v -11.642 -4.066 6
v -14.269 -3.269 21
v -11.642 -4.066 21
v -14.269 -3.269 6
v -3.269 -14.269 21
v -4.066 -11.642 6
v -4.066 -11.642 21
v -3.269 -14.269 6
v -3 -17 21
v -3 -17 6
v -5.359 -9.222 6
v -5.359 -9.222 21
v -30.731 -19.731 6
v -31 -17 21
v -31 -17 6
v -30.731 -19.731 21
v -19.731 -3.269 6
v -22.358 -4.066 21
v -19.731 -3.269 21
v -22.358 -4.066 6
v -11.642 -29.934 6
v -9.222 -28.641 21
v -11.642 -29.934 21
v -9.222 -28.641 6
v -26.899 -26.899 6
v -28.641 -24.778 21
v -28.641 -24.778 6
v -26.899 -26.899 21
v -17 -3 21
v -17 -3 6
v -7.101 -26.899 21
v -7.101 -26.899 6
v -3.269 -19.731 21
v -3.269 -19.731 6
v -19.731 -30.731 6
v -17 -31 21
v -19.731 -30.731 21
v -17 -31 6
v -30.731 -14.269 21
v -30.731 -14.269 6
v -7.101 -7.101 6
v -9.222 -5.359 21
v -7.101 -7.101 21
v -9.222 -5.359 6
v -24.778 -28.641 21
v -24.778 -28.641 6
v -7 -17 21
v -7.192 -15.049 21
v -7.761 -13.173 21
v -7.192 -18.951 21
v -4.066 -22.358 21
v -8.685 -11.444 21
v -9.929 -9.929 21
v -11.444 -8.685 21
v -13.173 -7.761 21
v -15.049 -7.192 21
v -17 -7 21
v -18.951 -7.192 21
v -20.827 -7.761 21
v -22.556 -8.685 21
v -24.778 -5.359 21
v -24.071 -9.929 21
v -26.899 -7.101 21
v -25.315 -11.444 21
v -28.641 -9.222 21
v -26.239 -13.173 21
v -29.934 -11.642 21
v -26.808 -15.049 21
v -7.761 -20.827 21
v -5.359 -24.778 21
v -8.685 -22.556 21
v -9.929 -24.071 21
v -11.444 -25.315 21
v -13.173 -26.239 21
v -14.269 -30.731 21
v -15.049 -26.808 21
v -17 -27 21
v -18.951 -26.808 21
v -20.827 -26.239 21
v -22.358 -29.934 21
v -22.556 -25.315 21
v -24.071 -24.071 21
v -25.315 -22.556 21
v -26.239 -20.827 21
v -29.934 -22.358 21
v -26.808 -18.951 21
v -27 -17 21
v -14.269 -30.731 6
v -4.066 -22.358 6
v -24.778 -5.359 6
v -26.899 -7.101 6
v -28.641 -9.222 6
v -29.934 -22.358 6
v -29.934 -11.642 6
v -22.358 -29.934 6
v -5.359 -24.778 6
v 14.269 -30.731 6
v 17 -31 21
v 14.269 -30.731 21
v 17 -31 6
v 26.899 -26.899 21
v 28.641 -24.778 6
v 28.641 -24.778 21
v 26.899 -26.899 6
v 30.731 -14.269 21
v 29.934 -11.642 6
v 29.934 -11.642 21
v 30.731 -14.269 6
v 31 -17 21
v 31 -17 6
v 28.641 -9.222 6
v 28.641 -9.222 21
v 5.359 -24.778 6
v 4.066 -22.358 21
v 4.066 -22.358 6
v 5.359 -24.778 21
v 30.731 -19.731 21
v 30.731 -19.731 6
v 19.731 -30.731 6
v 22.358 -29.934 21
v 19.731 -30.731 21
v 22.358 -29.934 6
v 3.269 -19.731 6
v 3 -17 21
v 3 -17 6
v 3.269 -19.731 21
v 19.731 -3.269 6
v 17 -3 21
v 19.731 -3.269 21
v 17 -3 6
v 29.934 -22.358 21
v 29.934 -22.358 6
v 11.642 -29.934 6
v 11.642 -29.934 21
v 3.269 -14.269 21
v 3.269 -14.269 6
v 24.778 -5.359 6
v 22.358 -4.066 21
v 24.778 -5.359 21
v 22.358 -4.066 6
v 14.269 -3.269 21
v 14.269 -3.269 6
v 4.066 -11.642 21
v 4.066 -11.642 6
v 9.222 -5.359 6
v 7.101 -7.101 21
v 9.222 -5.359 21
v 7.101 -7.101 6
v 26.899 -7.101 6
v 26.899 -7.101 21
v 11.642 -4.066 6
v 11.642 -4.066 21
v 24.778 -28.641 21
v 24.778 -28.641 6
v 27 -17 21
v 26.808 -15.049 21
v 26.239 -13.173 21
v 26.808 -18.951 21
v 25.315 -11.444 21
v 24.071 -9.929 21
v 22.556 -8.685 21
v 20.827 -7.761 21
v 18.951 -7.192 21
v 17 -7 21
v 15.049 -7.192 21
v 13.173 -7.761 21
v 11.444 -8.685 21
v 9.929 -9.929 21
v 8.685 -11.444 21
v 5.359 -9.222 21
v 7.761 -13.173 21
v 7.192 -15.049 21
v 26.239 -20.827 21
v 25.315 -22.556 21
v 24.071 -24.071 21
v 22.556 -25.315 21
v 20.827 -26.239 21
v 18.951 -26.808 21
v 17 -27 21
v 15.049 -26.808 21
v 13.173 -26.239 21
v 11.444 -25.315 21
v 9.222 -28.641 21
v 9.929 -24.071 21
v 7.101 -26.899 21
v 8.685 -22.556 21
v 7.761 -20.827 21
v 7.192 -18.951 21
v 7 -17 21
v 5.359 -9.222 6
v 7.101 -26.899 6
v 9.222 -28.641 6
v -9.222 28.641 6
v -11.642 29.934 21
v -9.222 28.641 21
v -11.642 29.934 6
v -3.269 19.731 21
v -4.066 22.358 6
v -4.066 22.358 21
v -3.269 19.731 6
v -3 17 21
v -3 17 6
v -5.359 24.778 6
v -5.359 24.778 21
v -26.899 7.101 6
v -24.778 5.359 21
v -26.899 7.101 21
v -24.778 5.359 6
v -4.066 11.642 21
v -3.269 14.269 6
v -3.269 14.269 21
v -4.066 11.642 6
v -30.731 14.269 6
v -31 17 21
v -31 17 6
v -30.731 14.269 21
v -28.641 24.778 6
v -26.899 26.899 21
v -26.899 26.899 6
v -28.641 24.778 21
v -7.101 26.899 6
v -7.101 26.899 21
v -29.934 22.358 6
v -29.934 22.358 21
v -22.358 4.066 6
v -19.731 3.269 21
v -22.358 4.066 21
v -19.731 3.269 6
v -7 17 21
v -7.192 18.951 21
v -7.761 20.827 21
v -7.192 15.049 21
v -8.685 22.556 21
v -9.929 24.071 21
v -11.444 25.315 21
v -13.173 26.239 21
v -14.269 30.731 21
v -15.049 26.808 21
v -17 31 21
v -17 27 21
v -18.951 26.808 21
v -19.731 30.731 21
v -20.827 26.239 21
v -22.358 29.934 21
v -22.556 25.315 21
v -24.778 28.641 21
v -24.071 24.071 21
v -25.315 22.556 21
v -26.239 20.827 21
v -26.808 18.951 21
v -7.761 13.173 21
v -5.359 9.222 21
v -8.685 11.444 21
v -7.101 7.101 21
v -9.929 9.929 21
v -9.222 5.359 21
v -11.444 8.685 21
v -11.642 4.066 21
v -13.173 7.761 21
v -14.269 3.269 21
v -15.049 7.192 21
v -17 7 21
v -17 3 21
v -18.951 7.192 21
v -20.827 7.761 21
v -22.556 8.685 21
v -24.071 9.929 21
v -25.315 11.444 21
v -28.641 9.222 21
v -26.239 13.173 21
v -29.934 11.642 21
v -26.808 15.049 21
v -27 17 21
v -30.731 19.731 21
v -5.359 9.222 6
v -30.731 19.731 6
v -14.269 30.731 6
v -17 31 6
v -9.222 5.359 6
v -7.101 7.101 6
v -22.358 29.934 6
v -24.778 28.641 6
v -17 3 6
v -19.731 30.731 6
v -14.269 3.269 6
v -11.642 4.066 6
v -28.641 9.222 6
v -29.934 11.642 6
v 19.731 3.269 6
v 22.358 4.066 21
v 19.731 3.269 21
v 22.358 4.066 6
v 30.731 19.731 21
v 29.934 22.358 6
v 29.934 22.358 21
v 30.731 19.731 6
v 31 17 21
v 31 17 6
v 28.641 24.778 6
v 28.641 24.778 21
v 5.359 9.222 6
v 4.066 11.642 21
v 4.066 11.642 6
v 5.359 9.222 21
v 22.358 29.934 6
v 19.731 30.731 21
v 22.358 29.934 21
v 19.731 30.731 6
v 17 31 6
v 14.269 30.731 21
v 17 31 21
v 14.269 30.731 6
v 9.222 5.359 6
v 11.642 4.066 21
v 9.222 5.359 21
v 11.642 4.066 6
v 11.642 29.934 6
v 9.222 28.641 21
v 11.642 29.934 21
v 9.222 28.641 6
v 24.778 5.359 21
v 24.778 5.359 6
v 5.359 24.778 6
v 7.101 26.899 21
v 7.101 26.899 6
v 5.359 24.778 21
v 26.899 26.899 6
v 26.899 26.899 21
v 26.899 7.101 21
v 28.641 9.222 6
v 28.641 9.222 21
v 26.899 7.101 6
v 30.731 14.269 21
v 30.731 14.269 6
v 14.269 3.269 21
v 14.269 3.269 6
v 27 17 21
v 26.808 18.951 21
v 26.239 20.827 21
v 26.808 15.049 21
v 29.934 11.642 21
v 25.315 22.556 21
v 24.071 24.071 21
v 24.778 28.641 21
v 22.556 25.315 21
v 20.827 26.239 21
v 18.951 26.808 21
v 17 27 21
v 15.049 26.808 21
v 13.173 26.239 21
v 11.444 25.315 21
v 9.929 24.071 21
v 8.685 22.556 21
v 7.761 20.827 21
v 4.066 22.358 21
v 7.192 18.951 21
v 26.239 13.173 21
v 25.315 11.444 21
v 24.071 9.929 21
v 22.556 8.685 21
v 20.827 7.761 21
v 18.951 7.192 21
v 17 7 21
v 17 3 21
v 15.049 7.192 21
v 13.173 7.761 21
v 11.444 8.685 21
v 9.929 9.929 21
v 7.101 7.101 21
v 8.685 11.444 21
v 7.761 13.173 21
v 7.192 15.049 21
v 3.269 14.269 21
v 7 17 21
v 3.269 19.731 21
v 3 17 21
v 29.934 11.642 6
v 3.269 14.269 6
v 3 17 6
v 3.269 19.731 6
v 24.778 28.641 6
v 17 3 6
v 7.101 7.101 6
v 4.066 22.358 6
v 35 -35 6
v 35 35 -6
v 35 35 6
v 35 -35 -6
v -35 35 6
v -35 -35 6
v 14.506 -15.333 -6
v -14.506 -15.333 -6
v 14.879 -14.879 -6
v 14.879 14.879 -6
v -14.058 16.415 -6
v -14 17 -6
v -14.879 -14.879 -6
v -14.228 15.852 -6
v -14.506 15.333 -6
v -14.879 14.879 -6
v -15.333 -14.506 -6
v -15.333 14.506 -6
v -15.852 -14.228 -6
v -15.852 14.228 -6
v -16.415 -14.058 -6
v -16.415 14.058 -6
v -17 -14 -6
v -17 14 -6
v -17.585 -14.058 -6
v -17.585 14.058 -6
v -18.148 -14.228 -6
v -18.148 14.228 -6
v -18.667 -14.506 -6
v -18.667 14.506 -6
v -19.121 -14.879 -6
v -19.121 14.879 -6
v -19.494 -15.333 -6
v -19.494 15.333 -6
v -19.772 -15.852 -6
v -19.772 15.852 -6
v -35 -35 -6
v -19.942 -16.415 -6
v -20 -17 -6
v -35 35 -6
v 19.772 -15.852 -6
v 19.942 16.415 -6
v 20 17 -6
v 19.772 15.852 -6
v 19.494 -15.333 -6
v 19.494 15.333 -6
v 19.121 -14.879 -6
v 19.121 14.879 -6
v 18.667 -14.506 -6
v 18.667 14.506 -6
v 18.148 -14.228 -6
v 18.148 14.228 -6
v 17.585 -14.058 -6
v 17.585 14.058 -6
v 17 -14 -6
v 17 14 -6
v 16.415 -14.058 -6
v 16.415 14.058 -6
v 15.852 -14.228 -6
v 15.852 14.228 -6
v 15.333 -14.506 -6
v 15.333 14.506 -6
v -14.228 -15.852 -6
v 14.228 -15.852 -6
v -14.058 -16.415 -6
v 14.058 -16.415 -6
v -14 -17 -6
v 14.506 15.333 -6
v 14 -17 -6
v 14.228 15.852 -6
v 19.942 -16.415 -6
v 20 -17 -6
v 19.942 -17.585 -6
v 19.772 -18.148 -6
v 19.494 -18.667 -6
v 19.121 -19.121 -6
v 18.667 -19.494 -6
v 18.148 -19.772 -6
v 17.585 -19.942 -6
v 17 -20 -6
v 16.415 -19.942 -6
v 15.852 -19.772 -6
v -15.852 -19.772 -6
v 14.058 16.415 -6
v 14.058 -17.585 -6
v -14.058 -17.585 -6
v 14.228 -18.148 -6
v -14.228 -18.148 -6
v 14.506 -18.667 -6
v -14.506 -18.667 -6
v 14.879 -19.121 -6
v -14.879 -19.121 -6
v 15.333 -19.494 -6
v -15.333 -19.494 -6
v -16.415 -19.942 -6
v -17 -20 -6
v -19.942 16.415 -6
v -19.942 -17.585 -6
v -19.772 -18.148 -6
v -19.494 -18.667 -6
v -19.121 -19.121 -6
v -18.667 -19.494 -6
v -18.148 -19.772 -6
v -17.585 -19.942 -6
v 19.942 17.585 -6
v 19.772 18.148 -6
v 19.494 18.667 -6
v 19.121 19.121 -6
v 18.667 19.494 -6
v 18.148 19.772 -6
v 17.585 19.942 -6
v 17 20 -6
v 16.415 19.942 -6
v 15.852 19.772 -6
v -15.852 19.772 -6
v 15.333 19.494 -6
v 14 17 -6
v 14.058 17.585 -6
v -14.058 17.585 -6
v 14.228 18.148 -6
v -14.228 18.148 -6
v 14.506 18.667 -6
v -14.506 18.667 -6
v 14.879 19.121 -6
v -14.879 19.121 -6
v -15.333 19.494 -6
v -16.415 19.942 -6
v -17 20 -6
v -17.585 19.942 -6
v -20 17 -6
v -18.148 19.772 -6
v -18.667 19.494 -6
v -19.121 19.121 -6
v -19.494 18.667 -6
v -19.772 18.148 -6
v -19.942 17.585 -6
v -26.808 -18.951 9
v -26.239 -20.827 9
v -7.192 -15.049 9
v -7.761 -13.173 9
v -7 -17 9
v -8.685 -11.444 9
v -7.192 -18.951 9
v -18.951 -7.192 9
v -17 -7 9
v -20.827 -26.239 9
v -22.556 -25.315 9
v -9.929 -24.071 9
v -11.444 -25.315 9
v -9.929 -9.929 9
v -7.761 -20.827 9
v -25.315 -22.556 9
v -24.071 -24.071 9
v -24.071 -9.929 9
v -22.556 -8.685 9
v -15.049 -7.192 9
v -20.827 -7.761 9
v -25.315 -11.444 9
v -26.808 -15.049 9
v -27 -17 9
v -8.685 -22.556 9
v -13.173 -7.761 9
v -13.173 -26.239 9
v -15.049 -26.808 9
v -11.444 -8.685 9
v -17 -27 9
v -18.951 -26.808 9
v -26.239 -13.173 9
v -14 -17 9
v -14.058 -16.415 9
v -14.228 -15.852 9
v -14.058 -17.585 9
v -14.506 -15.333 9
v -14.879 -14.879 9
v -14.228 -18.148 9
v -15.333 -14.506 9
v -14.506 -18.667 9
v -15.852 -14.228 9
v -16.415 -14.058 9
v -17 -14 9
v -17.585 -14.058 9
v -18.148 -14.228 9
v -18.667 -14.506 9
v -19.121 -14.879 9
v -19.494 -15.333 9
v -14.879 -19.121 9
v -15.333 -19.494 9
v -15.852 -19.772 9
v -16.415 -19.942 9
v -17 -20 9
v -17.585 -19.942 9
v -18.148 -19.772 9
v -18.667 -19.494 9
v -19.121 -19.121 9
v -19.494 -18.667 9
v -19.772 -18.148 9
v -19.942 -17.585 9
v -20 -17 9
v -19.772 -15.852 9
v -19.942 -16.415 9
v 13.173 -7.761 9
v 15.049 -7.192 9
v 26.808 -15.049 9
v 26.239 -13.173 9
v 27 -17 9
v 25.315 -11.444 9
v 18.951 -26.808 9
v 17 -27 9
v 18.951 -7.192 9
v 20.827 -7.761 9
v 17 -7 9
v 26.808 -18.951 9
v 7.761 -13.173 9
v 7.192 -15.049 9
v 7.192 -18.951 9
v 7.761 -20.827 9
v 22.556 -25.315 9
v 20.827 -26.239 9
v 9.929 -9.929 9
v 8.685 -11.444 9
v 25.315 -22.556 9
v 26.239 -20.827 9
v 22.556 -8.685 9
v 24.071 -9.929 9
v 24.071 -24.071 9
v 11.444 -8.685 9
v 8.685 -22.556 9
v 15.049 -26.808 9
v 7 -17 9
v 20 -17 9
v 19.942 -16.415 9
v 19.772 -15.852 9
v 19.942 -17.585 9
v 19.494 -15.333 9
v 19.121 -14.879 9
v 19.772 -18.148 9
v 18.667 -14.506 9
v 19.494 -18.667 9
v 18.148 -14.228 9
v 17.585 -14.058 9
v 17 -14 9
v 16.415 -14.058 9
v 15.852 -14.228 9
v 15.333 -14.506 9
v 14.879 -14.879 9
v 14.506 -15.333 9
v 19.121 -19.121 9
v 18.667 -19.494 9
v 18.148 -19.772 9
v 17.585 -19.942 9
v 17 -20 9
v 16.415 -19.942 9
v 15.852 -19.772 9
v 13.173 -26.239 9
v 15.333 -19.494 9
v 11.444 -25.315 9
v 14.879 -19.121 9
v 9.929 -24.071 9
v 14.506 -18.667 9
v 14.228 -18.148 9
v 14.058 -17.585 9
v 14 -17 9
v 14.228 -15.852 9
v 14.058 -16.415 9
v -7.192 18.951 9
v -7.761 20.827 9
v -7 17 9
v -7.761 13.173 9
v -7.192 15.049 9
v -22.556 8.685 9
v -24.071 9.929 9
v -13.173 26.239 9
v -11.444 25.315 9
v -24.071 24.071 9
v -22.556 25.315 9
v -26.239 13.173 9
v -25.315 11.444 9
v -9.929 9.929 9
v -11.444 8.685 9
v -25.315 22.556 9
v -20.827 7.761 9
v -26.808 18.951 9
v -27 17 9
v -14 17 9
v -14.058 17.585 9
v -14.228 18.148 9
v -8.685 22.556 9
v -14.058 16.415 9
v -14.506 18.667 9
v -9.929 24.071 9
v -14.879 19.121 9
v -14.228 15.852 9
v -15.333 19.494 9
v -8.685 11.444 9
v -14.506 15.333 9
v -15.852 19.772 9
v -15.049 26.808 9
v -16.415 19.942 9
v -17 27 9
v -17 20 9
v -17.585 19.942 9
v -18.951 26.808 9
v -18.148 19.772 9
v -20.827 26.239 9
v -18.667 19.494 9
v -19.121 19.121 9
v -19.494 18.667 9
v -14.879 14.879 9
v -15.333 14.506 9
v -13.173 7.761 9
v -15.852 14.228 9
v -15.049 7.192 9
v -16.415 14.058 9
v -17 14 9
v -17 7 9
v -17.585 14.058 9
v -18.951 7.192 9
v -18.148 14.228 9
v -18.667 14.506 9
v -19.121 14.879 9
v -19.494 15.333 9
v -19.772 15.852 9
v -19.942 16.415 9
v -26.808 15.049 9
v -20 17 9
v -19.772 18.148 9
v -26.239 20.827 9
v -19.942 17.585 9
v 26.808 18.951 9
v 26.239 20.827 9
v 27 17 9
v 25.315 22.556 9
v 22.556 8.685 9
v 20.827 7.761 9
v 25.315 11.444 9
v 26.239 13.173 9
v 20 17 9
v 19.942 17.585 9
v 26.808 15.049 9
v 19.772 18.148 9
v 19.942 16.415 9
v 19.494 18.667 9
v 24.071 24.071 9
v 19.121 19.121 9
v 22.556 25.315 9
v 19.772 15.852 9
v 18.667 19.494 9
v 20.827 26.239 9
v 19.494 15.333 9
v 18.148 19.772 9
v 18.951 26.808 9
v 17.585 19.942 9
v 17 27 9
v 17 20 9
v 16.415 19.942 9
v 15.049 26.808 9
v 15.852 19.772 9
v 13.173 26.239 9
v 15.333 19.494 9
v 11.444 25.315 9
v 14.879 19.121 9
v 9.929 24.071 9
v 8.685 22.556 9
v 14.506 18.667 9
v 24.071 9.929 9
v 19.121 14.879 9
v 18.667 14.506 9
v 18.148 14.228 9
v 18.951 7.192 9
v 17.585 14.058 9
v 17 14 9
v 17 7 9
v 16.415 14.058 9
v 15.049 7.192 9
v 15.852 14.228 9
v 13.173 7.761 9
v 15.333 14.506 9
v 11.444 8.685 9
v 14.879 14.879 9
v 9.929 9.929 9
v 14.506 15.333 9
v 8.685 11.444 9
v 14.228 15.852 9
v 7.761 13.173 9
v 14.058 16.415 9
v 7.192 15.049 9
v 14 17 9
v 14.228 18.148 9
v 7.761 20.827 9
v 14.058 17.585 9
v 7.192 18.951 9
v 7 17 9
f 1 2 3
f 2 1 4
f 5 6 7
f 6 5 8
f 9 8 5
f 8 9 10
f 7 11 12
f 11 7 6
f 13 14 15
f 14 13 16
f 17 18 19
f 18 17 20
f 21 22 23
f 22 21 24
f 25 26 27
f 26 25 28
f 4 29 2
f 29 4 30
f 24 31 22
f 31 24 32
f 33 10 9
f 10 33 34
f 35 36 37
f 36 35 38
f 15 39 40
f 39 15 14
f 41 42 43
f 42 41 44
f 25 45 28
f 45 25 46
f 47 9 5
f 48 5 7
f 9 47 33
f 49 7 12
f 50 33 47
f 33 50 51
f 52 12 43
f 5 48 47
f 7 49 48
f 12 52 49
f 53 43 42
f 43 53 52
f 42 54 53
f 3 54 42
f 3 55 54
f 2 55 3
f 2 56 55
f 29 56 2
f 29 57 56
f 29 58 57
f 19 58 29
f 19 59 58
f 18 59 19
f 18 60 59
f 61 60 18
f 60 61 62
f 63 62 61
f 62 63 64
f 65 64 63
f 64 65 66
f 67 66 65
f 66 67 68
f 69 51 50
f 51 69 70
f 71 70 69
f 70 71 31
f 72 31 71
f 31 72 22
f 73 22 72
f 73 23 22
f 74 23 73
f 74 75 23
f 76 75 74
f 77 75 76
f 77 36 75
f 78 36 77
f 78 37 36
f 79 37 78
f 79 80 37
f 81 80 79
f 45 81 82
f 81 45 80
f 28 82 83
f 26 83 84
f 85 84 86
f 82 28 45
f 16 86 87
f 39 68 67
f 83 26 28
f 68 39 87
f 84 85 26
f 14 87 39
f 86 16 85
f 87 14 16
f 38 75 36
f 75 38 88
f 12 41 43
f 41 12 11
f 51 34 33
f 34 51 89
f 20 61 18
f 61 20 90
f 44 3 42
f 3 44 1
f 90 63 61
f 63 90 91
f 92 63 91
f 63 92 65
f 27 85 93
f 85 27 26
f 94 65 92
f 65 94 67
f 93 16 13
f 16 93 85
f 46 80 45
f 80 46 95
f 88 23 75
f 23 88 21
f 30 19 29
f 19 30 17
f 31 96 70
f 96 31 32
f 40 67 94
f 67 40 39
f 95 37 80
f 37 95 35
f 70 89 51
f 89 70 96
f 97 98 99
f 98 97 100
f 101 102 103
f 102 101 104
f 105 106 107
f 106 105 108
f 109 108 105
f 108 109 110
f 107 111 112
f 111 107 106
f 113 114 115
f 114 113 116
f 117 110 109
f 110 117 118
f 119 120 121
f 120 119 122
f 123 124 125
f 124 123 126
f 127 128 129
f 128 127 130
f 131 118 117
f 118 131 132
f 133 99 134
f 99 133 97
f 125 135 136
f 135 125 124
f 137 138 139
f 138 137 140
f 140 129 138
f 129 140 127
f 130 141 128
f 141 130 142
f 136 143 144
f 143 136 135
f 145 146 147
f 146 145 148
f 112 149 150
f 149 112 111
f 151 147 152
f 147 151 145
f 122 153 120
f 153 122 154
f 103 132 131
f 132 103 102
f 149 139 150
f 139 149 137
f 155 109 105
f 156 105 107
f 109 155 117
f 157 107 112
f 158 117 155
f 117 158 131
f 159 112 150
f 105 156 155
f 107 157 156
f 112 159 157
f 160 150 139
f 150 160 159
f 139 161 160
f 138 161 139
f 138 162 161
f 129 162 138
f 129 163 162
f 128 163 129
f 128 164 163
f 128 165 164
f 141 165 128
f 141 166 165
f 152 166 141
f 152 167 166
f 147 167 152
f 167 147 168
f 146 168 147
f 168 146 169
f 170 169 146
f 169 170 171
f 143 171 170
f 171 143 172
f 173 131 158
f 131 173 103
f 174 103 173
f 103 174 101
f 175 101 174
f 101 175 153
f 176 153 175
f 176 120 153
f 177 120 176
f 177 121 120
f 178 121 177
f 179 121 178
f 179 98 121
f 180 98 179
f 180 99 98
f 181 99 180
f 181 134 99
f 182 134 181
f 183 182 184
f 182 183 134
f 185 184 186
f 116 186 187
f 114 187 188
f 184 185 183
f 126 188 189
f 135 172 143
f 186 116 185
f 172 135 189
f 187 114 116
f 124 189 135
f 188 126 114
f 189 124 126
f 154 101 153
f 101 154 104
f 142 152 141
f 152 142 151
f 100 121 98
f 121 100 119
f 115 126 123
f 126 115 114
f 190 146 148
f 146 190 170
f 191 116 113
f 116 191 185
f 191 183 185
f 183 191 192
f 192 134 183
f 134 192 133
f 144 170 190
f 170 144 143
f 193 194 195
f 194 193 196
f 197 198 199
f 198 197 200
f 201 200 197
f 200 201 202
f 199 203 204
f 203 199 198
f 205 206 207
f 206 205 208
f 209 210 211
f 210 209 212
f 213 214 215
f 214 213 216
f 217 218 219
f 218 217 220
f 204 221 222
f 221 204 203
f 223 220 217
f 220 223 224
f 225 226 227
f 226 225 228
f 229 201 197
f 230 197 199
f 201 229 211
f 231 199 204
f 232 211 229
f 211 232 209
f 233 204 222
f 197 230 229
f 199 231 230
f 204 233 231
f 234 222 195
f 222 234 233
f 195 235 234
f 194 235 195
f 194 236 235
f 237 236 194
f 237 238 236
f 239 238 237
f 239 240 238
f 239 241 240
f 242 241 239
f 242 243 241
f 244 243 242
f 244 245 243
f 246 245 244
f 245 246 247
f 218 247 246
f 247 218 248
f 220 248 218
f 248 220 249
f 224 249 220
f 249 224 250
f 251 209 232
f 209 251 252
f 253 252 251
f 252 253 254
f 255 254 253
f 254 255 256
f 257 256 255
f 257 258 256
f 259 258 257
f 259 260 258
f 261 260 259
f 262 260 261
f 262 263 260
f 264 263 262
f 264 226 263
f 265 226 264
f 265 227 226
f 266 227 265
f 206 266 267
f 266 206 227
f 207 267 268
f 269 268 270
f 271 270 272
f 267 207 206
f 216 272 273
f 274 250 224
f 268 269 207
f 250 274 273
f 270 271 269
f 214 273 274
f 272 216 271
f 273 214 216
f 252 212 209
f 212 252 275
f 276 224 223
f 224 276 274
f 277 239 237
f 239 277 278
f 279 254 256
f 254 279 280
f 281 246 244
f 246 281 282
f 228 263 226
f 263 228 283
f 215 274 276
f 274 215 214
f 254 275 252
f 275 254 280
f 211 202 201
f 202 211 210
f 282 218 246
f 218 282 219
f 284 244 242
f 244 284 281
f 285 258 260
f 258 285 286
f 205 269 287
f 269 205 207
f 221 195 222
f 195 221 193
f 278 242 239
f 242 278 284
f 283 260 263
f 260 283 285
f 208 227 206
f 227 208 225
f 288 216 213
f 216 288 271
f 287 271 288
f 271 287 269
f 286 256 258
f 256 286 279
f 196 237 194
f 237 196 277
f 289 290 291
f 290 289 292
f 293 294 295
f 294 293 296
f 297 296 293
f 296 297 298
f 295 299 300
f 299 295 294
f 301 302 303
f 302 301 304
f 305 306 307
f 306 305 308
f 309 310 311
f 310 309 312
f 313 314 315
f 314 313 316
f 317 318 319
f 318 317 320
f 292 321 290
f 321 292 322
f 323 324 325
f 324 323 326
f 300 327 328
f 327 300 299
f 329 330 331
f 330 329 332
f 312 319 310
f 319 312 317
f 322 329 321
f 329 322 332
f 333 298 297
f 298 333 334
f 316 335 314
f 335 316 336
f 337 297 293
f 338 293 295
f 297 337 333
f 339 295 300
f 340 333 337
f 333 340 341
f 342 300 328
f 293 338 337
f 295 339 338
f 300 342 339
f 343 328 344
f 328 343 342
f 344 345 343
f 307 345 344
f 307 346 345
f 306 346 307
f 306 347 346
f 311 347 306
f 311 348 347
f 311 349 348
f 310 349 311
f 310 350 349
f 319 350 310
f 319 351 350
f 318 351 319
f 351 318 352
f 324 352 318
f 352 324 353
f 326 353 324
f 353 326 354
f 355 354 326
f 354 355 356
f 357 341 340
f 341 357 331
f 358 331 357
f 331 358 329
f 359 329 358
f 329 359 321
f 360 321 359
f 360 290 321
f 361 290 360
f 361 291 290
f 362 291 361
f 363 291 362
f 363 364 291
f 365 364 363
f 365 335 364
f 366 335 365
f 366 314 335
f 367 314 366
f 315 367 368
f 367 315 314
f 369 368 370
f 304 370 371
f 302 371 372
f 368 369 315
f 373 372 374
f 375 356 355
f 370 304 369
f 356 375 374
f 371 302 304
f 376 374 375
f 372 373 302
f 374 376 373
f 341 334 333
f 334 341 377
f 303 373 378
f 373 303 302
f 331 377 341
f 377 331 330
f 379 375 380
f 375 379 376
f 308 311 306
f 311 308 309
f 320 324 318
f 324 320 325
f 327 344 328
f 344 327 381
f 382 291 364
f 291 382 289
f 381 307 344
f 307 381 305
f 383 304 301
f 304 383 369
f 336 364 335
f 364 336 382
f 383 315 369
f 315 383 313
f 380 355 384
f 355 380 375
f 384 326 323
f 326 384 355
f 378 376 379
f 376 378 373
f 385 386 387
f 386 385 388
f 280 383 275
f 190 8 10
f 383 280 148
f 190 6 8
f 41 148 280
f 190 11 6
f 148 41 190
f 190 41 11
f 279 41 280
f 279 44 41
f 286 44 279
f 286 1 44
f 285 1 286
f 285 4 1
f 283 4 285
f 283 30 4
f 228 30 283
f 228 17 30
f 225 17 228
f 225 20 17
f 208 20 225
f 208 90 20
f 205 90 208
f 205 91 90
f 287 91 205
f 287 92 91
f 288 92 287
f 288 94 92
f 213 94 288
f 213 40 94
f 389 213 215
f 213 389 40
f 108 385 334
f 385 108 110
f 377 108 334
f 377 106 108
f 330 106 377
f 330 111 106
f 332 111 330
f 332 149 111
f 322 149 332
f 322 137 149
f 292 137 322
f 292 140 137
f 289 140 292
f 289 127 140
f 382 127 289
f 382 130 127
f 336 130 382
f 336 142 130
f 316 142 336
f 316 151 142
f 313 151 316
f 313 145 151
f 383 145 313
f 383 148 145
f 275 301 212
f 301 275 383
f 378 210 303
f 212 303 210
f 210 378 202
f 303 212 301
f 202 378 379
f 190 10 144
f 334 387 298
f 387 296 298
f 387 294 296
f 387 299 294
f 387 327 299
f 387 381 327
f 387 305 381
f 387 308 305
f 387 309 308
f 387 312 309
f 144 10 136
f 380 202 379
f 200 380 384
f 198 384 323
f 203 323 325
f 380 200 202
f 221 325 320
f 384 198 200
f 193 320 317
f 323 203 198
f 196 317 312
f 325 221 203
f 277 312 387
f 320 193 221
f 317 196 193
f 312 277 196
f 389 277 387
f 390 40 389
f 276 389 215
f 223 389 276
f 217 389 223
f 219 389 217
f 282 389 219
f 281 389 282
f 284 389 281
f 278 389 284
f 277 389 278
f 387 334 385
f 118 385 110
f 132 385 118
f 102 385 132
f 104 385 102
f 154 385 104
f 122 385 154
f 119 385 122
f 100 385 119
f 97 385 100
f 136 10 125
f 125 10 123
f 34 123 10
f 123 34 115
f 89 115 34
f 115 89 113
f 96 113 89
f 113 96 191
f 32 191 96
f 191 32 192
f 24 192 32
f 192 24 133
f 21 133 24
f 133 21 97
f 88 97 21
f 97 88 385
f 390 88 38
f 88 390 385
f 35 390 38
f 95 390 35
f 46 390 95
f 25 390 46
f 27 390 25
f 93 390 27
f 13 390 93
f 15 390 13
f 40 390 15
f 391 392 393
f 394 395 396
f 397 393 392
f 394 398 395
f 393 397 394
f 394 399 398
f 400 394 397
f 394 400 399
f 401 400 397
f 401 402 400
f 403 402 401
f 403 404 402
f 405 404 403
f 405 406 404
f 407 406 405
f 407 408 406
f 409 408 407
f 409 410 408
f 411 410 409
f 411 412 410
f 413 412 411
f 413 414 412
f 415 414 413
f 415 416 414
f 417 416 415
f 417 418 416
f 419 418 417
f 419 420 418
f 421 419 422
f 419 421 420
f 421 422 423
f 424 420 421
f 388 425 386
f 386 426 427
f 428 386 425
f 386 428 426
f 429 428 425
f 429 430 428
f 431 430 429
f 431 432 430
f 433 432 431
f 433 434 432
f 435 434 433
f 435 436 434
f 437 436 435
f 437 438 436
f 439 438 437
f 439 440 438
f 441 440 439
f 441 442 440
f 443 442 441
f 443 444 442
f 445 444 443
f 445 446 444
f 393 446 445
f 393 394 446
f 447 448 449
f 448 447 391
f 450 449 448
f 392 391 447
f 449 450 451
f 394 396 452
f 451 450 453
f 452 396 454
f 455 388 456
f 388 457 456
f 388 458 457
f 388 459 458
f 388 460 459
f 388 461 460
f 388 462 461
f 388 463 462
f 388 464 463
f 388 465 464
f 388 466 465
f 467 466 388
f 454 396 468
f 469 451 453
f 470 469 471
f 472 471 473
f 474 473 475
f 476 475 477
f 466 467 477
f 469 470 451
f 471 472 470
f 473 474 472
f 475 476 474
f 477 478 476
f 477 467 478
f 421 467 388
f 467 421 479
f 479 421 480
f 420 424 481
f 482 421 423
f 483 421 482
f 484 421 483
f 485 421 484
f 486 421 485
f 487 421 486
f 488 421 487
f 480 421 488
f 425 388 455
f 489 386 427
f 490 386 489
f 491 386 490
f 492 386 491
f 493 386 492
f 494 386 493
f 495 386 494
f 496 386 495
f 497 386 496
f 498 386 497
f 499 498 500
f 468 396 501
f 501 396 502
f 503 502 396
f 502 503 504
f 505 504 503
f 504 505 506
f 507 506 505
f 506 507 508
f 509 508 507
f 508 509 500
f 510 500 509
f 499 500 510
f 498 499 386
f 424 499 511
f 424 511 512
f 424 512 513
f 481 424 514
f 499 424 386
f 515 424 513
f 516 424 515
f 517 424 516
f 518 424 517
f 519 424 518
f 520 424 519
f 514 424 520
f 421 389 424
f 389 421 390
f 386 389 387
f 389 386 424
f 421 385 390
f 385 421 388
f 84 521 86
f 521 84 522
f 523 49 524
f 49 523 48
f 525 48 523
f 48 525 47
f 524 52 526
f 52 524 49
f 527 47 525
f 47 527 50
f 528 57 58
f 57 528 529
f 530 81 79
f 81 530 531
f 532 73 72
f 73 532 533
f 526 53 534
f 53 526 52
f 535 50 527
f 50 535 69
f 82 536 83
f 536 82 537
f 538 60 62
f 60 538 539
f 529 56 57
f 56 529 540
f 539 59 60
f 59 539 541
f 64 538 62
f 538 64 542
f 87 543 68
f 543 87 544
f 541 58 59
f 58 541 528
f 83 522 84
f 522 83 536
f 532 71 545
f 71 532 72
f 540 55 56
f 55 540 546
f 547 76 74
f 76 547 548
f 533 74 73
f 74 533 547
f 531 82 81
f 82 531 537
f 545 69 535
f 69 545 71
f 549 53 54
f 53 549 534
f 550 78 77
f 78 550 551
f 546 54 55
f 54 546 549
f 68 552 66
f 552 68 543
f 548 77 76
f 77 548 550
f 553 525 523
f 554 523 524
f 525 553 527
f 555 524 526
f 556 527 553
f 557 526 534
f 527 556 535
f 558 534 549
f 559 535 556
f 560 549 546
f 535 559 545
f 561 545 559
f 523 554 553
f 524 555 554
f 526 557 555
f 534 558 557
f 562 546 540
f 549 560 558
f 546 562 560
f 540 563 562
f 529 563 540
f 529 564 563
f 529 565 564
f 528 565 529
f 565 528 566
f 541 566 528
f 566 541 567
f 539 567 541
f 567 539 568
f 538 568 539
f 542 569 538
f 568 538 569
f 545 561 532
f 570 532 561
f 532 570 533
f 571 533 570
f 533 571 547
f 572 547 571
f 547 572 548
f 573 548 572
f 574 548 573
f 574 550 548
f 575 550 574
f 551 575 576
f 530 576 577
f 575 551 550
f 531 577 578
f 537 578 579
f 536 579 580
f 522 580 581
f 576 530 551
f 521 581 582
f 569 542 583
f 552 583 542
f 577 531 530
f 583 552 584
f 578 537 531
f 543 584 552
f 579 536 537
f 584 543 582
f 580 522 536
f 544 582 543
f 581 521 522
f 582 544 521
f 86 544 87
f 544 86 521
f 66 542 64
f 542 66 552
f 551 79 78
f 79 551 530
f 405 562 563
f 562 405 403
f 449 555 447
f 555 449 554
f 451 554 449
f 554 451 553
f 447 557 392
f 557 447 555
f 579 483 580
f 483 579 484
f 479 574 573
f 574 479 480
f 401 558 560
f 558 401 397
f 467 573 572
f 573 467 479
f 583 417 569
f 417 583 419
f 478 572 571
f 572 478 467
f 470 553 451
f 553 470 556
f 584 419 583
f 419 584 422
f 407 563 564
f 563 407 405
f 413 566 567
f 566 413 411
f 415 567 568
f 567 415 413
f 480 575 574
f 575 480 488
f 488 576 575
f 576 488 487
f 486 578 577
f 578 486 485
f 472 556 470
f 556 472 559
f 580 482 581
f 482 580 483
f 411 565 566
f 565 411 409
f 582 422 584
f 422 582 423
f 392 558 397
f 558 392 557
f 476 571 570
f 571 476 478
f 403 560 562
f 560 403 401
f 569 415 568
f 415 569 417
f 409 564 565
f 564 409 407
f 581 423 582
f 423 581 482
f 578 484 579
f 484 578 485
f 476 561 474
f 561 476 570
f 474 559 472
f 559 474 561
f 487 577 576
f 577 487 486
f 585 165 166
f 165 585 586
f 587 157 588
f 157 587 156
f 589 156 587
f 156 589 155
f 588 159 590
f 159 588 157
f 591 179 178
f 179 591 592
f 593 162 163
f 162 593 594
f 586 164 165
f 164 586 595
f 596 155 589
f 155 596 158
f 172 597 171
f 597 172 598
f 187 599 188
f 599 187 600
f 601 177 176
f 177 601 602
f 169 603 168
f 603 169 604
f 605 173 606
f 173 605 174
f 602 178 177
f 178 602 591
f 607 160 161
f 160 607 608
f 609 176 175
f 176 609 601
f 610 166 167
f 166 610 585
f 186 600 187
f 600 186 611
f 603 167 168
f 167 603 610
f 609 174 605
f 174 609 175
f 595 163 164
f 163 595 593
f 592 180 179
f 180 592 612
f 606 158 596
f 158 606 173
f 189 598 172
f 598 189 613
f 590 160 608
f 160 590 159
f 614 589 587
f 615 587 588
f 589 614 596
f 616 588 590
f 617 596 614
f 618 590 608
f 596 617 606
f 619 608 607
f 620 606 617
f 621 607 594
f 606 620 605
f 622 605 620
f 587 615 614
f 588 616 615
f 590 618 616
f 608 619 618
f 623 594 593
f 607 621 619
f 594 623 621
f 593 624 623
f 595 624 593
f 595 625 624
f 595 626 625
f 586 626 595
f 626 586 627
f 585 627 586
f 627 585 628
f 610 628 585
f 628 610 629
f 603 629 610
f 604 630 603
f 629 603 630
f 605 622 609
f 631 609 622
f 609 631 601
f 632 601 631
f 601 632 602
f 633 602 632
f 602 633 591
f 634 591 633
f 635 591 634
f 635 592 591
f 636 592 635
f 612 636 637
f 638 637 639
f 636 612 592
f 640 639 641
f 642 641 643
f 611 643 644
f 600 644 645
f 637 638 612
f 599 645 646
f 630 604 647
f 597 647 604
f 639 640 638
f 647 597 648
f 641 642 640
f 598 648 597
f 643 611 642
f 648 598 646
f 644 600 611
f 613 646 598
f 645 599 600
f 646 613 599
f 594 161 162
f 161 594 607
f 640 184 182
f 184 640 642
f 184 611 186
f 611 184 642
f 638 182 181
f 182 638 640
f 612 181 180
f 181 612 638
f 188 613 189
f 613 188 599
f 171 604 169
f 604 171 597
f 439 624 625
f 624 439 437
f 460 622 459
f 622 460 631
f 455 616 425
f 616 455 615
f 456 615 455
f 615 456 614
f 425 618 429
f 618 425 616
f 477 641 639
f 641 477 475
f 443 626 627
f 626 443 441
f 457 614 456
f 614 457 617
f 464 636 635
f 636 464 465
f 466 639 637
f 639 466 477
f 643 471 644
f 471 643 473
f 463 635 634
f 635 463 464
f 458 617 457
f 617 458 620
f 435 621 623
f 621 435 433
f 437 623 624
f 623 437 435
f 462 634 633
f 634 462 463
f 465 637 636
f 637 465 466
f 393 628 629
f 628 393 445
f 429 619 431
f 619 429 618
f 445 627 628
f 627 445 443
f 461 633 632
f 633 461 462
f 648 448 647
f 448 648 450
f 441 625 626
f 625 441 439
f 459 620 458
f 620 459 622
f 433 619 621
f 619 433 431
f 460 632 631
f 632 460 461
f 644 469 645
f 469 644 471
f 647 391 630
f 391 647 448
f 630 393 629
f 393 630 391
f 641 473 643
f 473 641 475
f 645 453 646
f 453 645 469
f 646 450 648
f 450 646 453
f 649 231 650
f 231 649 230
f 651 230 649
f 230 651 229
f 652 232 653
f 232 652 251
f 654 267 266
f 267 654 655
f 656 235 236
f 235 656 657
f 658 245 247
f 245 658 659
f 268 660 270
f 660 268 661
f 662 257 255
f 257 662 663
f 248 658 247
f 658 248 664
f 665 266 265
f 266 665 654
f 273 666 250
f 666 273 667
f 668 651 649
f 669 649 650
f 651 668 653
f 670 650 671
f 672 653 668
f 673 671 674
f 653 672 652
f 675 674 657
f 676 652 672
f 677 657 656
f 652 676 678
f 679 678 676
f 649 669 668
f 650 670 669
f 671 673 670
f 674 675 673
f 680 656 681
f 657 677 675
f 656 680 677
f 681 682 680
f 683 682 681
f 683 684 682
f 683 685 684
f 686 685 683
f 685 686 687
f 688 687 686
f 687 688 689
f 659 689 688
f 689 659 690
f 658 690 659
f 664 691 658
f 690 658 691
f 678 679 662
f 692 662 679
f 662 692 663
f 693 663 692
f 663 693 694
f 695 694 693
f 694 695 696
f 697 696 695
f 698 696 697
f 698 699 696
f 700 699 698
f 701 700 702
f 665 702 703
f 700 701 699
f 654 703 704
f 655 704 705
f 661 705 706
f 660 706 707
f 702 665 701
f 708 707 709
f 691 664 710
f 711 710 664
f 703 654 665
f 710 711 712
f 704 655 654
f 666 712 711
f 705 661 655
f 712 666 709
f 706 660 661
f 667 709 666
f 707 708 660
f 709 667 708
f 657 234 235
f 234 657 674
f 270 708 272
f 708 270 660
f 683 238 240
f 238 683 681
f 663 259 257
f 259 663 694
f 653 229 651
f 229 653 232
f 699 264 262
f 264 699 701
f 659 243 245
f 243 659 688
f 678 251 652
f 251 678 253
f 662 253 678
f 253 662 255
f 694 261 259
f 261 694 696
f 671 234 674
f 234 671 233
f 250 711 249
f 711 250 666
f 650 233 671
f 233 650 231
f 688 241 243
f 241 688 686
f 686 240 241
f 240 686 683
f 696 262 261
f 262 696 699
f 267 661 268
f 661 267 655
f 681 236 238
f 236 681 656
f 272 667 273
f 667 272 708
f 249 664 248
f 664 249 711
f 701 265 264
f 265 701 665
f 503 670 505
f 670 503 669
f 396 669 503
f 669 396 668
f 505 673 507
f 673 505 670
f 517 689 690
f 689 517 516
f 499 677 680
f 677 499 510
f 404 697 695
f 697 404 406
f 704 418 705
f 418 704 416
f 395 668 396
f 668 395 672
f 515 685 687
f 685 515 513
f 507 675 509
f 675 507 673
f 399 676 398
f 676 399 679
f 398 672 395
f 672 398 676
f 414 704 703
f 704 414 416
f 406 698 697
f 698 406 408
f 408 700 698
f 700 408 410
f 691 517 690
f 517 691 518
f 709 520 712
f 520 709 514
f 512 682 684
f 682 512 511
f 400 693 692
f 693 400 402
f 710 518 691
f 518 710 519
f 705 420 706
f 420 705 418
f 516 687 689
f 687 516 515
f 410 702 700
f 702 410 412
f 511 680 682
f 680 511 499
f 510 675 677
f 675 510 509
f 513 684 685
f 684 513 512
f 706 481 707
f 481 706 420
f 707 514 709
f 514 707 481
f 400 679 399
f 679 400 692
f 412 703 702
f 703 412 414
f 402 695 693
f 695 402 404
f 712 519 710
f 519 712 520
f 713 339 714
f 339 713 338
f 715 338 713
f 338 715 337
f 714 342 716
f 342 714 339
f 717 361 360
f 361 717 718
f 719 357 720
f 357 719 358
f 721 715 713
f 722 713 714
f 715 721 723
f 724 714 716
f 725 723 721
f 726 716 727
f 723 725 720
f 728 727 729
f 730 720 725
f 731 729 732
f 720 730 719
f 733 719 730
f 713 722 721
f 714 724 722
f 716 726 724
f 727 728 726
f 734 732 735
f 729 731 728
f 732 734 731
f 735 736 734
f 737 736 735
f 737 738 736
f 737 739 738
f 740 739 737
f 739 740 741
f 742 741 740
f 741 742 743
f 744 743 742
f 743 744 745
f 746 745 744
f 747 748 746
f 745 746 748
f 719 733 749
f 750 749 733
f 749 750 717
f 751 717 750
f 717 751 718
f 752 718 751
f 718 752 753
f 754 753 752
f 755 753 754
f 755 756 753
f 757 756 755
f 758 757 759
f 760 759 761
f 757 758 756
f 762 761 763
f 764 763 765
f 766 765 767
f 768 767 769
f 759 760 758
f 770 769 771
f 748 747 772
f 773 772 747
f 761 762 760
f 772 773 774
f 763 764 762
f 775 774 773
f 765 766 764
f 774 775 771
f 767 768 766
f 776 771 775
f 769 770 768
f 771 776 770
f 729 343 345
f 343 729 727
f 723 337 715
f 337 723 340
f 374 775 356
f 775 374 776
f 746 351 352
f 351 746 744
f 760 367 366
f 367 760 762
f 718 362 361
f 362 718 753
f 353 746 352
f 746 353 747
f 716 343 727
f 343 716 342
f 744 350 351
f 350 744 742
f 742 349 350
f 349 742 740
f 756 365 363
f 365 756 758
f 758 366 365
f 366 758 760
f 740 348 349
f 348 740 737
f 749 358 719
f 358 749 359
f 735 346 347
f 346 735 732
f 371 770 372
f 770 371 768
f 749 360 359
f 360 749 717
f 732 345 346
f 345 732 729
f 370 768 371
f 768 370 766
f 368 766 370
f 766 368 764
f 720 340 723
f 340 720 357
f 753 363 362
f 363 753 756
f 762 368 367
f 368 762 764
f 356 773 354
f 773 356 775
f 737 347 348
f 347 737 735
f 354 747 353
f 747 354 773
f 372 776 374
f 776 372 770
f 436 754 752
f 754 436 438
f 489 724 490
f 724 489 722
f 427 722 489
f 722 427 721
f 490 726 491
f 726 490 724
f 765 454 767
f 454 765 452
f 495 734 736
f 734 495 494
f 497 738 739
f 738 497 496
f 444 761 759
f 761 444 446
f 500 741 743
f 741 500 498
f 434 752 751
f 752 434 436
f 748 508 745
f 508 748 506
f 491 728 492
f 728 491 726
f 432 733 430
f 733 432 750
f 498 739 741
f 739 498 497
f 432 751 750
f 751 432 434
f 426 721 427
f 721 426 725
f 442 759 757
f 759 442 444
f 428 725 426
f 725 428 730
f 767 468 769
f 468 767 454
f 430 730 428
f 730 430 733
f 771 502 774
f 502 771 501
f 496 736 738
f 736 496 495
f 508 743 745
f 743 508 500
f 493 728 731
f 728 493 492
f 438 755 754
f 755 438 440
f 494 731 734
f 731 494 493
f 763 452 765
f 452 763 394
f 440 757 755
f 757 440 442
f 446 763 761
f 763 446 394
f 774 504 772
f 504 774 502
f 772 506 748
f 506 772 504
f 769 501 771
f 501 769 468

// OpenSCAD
$fn = 32;

// ----------------------------------------------------------------------
// Socket pad plate
// bosses with counterbored sockets for the screws
// ----------------------------------------------------------------------

// --- parameters (mm) ---
base_t = 12;        // base plate thickness
boss_h = 15;        // boss height above the base plate
boss_d = 28;        // boss diameter
socket_d = 20;      // socket diameter
socket_depth = 12;  // socket depth from the boss face
bolt_d = 6;         // screw clearance hole through the socket floor
rows = 2;           // boss rows
cols = 2;           // bosses per row
pitch = 34;         // boss pitch

// --- derived feature positions (mm) ---
height = base_t + boss_h;           // = 27   overall height of the part
plate = [pitch * (cols - 1) + boss_d + 8, pitch * (rows - 1) + boss_d + 8, base_t];  // = [70, 70, 12]   overall size (x, y, z)
span_x = pitch * (cols - 1);        // = 34   distance between outer bosses
span_y = pitch * (rows - 1);        // = 34   distance between boss rows
origin_x = -span_x / 2;             // = -17   X of the first boss
origin_y = -span_y / 2;             // = -17   Y of the first boss
feature_centers = [
  [origin_x + 0 * pitch, origin_y + 0 * pitch],
  [origin_x + 1 * pitch, origin_y + 0 * pitch],
  [origin_x + 0 * pitch, origin_y + 1 * pitch],
  [origin_x + 1 * pitch, origin_y + 1 * pitch]
];   // boss centres: sockets, holes and the pads themselves are placed from here

// base plate, bosses on feature_centers, socket + through hole in each
difference() {
  union() {
    cube(plate, center = true);
    for (centre = feature_centers)
      translate([centre[0], centre[1], plate[2] / 2 - 1])
        cylinder(d = boss_d, h = boss_h + 1);
  }
  for (centre = feature_centers) {
    translate([centre[0], centre[1], plate[2] / 2 + boss_h - socket_depth])
      cylinder(d = socket_d, h = socket_depth + 1);
    translate([centre[0], centre[1], -height])
      cylinder(d = bolt_d, h = 2 * height + 2);  // through the socket floor
  }
}
